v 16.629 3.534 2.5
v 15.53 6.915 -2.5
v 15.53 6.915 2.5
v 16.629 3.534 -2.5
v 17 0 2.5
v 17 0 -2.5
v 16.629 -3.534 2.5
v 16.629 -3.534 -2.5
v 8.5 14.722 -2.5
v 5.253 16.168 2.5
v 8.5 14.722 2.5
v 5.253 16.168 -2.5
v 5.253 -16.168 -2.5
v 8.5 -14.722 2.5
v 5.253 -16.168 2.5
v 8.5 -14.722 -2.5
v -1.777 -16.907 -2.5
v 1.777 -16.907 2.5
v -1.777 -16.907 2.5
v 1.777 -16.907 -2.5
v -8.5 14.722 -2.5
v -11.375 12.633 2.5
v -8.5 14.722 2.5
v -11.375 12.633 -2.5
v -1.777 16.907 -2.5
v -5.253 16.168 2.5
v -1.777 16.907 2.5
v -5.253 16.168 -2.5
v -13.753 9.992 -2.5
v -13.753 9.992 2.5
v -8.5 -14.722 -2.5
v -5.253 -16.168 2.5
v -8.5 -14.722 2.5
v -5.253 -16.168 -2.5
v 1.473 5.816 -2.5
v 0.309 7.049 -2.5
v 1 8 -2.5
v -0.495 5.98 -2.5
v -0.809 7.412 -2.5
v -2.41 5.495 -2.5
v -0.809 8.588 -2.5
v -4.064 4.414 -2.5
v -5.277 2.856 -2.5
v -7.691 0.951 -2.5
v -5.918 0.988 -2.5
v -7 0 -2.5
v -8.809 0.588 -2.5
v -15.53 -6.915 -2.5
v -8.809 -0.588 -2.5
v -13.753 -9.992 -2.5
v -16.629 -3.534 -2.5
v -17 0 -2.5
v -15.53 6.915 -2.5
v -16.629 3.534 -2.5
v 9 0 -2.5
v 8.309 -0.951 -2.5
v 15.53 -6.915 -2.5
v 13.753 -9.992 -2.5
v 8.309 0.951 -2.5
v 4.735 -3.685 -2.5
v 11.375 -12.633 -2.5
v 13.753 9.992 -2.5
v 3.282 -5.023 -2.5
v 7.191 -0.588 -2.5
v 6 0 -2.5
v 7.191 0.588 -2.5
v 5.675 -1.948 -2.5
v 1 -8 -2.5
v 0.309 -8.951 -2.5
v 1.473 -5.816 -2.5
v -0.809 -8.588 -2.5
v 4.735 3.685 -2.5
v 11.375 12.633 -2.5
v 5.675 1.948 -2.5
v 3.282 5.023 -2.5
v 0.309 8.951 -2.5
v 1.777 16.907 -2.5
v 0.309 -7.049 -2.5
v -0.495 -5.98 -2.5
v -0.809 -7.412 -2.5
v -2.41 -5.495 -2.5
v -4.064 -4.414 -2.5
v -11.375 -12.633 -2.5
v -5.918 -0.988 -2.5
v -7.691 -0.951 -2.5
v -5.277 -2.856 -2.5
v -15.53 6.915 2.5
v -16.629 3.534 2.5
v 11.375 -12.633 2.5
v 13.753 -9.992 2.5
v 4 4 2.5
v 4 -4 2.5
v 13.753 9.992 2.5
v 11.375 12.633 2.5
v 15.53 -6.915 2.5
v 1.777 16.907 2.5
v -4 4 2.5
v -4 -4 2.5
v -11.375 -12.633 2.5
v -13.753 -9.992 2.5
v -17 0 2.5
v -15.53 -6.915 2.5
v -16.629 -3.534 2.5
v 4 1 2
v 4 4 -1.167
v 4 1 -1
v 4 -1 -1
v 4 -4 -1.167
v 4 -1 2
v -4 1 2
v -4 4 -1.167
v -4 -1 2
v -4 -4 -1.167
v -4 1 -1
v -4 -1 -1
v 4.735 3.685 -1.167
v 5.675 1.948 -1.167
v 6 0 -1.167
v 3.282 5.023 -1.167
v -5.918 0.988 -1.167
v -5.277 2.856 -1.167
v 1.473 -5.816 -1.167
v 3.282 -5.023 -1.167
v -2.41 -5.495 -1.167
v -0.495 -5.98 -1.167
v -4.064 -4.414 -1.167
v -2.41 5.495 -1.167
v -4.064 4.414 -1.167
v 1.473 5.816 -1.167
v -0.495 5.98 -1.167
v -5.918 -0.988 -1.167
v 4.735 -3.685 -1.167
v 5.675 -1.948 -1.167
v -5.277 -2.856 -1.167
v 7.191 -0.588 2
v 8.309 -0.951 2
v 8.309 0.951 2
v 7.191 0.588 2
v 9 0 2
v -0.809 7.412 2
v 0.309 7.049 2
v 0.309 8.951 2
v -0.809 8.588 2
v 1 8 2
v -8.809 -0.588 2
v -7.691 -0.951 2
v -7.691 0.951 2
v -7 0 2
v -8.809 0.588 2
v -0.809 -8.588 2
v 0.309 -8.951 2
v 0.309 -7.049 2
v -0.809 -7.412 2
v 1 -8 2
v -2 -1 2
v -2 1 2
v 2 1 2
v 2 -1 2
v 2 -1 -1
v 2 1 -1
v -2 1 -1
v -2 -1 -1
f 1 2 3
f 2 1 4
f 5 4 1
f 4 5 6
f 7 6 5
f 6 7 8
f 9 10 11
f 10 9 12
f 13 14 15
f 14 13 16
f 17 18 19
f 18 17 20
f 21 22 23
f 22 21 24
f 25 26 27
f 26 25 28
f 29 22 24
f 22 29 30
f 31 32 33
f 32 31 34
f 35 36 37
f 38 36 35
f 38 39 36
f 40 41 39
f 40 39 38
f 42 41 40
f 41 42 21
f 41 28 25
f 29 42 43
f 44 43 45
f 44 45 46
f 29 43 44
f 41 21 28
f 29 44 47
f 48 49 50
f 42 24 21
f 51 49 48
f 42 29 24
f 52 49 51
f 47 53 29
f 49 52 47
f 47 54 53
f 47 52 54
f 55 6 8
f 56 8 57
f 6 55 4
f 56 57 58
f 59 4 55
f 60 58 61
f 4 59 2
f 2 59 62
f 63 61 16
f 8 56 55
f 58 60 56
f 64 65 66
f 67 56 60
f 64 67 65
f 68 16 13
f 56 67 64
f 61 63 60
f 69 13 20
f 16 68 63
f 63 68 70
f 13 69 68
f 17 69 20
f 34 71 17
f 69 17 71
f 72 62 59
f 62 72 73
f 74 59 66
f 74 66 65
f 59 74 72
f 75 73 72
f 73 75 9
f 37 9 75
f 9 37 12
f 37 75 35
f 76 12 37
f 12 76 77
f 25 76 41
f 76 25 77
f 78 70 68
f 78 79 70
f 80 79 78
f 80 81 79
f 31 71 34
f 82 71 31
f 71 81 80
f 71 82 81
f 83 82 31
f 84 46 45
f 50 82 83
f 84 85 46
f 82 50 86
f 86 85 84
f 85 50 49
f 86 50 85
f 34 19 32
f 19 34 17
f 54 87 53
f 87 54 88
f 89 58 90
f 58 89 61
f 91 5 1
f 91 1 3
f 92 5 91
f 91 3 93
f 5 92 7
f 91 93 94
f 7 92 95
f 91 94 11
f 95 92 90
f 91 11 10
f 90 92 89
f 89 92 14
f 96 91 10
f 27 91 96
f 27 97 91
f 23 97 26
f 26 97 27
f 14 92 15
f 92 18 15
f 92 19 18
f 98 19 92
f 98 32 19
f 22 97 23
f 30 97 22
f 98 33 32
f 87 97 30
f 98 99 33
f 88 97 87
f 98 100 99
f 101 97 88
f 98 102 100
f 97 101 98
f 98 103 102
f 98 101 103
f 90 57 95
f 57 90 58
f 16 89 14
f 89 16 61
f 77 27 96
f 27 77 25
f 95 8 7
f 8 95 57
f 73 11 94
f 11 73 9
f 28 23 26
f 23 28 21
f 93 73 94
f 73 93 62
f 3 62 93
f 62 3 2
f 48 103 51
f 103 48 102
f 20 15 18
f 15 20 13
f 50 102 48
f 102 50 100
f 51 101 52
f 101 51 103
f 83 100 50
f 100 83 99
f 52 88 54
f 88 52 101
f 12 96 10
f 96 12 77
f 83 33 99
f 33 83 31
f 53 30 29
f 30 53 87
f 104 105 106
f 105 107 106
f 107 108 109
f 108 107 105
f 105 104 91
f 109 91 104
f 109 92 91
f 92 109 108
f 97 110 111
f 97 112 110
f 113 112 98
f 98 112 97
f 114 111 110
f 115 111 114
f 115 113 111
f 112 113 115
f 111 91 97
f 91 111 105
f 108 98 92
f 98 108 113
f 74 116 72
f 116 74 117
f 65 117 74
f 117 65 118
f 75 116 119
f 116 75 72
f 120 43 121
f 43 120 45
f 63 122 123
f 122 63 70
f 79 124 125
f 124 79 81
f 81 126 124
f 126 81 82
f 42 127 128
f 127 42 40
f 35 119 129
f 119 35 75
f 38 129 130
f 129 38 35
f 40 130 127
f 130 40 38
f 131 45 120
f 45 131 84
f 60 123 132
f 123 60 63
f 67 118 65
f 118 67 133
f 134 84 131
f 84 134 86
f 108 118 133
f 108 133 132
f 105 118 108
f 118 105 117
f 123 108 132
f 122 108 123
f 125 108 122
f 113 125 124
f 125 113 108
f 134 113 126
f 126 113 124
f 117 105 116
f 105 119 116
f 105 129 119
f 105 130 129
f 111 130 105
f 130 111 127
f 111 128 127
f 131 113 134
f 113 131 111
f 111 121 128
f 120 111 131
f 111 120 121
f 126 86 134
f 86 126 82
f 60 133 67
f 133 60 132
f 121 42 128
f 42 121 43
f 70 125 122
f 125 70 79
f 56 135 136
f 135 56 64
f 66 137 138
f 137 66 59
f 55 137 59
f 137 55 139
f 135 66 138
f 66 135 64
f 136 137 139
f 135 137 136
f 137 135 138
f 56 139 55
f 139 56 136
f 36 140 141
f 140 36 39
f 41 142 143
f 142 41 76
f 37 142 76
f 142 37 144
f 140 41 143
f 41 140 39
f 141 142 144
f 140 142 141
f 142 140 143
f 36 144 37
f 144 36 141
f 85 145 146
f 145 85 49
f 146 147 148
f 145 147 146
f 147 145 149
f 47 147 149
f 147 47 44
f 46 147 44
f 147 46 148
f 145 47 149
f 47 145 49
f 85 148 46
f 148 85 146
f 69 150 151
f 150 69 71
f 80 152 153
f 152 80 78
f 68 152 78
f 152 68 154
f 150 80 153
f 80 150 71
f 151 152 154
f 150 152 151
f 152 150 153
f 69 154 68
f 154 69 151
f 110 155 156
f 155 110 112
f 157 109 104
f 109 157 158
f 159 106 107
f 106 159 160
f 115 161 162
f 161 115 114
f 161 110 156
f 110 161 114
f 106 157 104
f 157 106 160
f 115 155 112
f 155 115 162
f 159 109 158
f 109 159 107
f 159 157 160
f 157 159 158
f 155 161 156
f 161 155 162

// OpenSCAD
// file: ruler.scad
module ruler(length)
{
    mark_width = 0.125;
    mark_depth = 0.05;

    difference()
    {
        cube( [1, length, 8 ] );
        for ( i = [1:length-1] )
        {
            translate( [mark_depth, i, 0] ) cube( [1, mark_width, 3 ] );
            translate( [-mark_depth, i, 0] ) cube( [1, mark_width, 3 ] );
            if (i % 5 == 0)
            {
                translate( [mark_depth, i, 0] ) cube( [5, mark_width, 5 ] );
                translate( [-mark_depth, i, 0] ) cube( [5, mark_width, 5 ] );
            }
            if (i % 10 == 0)
            {
                translate( [mark_depth, i, 0] ) cube( [10, mark_width, 7 ] );
                translate( [-mark_depth, i, 0] ) cube( [10, mark_width, 7 ] );
            }
        }
    }
}
// main file
include <gear.scad>            
include <ruler.scad>

n1           = 17; // number of teeth
mm_per_tooth = 5; 
thickness    = 5;
hole         = 0;

// translate([ 0, 0, 3]) ruler(200);

union(){
    difference(){
        color([1.00,1.00,1.00])
        // gear(mm_per_tooth,n1,thickness,hole);
        cylinder(thickness, 17, 17, center=true);
        
        color([1.00,1.00,1.00])
        cube(size=[8, 8, thickness + 1], center=true);
        
        color([1.00,1.00,1.00])
        translate([0, 0, -2])
        cylinder(thickness / 3, 6, 6, center=true);

        color([1.00,1.00,1.00])
        translate([8, 0, -1 * thickness +2/ 2])
        cylinder(thickness + 1, 1, 1);
        
        color([1.00,1.00,1.00])
        translate([0, 8, -1 * thickness +2/ 2])
        cylinder(thickness + 1, 1, 1);
        
        color([1.00,1.00,1.00])
        translate([-8, 0, -1 * thickness + 2/ 2])
        cylinder(thickness + 1, 1, 1);
        
        color([1.00,1.00,1.00])
        translate([0, -8, -1 * thickness + 2 / 2])
        cylinder(thickness + 1, 1, 1);
    }
    
    difference() {
        color([1.00,1.00,1.00])
        translate([-4, -1, -1])
        cube(size=[8, 2, thickness - 2]);
        
        color([1.00,1.00,1.00])
        cube(size=[4, 4, thickness + 1], center=true);
    }
}
